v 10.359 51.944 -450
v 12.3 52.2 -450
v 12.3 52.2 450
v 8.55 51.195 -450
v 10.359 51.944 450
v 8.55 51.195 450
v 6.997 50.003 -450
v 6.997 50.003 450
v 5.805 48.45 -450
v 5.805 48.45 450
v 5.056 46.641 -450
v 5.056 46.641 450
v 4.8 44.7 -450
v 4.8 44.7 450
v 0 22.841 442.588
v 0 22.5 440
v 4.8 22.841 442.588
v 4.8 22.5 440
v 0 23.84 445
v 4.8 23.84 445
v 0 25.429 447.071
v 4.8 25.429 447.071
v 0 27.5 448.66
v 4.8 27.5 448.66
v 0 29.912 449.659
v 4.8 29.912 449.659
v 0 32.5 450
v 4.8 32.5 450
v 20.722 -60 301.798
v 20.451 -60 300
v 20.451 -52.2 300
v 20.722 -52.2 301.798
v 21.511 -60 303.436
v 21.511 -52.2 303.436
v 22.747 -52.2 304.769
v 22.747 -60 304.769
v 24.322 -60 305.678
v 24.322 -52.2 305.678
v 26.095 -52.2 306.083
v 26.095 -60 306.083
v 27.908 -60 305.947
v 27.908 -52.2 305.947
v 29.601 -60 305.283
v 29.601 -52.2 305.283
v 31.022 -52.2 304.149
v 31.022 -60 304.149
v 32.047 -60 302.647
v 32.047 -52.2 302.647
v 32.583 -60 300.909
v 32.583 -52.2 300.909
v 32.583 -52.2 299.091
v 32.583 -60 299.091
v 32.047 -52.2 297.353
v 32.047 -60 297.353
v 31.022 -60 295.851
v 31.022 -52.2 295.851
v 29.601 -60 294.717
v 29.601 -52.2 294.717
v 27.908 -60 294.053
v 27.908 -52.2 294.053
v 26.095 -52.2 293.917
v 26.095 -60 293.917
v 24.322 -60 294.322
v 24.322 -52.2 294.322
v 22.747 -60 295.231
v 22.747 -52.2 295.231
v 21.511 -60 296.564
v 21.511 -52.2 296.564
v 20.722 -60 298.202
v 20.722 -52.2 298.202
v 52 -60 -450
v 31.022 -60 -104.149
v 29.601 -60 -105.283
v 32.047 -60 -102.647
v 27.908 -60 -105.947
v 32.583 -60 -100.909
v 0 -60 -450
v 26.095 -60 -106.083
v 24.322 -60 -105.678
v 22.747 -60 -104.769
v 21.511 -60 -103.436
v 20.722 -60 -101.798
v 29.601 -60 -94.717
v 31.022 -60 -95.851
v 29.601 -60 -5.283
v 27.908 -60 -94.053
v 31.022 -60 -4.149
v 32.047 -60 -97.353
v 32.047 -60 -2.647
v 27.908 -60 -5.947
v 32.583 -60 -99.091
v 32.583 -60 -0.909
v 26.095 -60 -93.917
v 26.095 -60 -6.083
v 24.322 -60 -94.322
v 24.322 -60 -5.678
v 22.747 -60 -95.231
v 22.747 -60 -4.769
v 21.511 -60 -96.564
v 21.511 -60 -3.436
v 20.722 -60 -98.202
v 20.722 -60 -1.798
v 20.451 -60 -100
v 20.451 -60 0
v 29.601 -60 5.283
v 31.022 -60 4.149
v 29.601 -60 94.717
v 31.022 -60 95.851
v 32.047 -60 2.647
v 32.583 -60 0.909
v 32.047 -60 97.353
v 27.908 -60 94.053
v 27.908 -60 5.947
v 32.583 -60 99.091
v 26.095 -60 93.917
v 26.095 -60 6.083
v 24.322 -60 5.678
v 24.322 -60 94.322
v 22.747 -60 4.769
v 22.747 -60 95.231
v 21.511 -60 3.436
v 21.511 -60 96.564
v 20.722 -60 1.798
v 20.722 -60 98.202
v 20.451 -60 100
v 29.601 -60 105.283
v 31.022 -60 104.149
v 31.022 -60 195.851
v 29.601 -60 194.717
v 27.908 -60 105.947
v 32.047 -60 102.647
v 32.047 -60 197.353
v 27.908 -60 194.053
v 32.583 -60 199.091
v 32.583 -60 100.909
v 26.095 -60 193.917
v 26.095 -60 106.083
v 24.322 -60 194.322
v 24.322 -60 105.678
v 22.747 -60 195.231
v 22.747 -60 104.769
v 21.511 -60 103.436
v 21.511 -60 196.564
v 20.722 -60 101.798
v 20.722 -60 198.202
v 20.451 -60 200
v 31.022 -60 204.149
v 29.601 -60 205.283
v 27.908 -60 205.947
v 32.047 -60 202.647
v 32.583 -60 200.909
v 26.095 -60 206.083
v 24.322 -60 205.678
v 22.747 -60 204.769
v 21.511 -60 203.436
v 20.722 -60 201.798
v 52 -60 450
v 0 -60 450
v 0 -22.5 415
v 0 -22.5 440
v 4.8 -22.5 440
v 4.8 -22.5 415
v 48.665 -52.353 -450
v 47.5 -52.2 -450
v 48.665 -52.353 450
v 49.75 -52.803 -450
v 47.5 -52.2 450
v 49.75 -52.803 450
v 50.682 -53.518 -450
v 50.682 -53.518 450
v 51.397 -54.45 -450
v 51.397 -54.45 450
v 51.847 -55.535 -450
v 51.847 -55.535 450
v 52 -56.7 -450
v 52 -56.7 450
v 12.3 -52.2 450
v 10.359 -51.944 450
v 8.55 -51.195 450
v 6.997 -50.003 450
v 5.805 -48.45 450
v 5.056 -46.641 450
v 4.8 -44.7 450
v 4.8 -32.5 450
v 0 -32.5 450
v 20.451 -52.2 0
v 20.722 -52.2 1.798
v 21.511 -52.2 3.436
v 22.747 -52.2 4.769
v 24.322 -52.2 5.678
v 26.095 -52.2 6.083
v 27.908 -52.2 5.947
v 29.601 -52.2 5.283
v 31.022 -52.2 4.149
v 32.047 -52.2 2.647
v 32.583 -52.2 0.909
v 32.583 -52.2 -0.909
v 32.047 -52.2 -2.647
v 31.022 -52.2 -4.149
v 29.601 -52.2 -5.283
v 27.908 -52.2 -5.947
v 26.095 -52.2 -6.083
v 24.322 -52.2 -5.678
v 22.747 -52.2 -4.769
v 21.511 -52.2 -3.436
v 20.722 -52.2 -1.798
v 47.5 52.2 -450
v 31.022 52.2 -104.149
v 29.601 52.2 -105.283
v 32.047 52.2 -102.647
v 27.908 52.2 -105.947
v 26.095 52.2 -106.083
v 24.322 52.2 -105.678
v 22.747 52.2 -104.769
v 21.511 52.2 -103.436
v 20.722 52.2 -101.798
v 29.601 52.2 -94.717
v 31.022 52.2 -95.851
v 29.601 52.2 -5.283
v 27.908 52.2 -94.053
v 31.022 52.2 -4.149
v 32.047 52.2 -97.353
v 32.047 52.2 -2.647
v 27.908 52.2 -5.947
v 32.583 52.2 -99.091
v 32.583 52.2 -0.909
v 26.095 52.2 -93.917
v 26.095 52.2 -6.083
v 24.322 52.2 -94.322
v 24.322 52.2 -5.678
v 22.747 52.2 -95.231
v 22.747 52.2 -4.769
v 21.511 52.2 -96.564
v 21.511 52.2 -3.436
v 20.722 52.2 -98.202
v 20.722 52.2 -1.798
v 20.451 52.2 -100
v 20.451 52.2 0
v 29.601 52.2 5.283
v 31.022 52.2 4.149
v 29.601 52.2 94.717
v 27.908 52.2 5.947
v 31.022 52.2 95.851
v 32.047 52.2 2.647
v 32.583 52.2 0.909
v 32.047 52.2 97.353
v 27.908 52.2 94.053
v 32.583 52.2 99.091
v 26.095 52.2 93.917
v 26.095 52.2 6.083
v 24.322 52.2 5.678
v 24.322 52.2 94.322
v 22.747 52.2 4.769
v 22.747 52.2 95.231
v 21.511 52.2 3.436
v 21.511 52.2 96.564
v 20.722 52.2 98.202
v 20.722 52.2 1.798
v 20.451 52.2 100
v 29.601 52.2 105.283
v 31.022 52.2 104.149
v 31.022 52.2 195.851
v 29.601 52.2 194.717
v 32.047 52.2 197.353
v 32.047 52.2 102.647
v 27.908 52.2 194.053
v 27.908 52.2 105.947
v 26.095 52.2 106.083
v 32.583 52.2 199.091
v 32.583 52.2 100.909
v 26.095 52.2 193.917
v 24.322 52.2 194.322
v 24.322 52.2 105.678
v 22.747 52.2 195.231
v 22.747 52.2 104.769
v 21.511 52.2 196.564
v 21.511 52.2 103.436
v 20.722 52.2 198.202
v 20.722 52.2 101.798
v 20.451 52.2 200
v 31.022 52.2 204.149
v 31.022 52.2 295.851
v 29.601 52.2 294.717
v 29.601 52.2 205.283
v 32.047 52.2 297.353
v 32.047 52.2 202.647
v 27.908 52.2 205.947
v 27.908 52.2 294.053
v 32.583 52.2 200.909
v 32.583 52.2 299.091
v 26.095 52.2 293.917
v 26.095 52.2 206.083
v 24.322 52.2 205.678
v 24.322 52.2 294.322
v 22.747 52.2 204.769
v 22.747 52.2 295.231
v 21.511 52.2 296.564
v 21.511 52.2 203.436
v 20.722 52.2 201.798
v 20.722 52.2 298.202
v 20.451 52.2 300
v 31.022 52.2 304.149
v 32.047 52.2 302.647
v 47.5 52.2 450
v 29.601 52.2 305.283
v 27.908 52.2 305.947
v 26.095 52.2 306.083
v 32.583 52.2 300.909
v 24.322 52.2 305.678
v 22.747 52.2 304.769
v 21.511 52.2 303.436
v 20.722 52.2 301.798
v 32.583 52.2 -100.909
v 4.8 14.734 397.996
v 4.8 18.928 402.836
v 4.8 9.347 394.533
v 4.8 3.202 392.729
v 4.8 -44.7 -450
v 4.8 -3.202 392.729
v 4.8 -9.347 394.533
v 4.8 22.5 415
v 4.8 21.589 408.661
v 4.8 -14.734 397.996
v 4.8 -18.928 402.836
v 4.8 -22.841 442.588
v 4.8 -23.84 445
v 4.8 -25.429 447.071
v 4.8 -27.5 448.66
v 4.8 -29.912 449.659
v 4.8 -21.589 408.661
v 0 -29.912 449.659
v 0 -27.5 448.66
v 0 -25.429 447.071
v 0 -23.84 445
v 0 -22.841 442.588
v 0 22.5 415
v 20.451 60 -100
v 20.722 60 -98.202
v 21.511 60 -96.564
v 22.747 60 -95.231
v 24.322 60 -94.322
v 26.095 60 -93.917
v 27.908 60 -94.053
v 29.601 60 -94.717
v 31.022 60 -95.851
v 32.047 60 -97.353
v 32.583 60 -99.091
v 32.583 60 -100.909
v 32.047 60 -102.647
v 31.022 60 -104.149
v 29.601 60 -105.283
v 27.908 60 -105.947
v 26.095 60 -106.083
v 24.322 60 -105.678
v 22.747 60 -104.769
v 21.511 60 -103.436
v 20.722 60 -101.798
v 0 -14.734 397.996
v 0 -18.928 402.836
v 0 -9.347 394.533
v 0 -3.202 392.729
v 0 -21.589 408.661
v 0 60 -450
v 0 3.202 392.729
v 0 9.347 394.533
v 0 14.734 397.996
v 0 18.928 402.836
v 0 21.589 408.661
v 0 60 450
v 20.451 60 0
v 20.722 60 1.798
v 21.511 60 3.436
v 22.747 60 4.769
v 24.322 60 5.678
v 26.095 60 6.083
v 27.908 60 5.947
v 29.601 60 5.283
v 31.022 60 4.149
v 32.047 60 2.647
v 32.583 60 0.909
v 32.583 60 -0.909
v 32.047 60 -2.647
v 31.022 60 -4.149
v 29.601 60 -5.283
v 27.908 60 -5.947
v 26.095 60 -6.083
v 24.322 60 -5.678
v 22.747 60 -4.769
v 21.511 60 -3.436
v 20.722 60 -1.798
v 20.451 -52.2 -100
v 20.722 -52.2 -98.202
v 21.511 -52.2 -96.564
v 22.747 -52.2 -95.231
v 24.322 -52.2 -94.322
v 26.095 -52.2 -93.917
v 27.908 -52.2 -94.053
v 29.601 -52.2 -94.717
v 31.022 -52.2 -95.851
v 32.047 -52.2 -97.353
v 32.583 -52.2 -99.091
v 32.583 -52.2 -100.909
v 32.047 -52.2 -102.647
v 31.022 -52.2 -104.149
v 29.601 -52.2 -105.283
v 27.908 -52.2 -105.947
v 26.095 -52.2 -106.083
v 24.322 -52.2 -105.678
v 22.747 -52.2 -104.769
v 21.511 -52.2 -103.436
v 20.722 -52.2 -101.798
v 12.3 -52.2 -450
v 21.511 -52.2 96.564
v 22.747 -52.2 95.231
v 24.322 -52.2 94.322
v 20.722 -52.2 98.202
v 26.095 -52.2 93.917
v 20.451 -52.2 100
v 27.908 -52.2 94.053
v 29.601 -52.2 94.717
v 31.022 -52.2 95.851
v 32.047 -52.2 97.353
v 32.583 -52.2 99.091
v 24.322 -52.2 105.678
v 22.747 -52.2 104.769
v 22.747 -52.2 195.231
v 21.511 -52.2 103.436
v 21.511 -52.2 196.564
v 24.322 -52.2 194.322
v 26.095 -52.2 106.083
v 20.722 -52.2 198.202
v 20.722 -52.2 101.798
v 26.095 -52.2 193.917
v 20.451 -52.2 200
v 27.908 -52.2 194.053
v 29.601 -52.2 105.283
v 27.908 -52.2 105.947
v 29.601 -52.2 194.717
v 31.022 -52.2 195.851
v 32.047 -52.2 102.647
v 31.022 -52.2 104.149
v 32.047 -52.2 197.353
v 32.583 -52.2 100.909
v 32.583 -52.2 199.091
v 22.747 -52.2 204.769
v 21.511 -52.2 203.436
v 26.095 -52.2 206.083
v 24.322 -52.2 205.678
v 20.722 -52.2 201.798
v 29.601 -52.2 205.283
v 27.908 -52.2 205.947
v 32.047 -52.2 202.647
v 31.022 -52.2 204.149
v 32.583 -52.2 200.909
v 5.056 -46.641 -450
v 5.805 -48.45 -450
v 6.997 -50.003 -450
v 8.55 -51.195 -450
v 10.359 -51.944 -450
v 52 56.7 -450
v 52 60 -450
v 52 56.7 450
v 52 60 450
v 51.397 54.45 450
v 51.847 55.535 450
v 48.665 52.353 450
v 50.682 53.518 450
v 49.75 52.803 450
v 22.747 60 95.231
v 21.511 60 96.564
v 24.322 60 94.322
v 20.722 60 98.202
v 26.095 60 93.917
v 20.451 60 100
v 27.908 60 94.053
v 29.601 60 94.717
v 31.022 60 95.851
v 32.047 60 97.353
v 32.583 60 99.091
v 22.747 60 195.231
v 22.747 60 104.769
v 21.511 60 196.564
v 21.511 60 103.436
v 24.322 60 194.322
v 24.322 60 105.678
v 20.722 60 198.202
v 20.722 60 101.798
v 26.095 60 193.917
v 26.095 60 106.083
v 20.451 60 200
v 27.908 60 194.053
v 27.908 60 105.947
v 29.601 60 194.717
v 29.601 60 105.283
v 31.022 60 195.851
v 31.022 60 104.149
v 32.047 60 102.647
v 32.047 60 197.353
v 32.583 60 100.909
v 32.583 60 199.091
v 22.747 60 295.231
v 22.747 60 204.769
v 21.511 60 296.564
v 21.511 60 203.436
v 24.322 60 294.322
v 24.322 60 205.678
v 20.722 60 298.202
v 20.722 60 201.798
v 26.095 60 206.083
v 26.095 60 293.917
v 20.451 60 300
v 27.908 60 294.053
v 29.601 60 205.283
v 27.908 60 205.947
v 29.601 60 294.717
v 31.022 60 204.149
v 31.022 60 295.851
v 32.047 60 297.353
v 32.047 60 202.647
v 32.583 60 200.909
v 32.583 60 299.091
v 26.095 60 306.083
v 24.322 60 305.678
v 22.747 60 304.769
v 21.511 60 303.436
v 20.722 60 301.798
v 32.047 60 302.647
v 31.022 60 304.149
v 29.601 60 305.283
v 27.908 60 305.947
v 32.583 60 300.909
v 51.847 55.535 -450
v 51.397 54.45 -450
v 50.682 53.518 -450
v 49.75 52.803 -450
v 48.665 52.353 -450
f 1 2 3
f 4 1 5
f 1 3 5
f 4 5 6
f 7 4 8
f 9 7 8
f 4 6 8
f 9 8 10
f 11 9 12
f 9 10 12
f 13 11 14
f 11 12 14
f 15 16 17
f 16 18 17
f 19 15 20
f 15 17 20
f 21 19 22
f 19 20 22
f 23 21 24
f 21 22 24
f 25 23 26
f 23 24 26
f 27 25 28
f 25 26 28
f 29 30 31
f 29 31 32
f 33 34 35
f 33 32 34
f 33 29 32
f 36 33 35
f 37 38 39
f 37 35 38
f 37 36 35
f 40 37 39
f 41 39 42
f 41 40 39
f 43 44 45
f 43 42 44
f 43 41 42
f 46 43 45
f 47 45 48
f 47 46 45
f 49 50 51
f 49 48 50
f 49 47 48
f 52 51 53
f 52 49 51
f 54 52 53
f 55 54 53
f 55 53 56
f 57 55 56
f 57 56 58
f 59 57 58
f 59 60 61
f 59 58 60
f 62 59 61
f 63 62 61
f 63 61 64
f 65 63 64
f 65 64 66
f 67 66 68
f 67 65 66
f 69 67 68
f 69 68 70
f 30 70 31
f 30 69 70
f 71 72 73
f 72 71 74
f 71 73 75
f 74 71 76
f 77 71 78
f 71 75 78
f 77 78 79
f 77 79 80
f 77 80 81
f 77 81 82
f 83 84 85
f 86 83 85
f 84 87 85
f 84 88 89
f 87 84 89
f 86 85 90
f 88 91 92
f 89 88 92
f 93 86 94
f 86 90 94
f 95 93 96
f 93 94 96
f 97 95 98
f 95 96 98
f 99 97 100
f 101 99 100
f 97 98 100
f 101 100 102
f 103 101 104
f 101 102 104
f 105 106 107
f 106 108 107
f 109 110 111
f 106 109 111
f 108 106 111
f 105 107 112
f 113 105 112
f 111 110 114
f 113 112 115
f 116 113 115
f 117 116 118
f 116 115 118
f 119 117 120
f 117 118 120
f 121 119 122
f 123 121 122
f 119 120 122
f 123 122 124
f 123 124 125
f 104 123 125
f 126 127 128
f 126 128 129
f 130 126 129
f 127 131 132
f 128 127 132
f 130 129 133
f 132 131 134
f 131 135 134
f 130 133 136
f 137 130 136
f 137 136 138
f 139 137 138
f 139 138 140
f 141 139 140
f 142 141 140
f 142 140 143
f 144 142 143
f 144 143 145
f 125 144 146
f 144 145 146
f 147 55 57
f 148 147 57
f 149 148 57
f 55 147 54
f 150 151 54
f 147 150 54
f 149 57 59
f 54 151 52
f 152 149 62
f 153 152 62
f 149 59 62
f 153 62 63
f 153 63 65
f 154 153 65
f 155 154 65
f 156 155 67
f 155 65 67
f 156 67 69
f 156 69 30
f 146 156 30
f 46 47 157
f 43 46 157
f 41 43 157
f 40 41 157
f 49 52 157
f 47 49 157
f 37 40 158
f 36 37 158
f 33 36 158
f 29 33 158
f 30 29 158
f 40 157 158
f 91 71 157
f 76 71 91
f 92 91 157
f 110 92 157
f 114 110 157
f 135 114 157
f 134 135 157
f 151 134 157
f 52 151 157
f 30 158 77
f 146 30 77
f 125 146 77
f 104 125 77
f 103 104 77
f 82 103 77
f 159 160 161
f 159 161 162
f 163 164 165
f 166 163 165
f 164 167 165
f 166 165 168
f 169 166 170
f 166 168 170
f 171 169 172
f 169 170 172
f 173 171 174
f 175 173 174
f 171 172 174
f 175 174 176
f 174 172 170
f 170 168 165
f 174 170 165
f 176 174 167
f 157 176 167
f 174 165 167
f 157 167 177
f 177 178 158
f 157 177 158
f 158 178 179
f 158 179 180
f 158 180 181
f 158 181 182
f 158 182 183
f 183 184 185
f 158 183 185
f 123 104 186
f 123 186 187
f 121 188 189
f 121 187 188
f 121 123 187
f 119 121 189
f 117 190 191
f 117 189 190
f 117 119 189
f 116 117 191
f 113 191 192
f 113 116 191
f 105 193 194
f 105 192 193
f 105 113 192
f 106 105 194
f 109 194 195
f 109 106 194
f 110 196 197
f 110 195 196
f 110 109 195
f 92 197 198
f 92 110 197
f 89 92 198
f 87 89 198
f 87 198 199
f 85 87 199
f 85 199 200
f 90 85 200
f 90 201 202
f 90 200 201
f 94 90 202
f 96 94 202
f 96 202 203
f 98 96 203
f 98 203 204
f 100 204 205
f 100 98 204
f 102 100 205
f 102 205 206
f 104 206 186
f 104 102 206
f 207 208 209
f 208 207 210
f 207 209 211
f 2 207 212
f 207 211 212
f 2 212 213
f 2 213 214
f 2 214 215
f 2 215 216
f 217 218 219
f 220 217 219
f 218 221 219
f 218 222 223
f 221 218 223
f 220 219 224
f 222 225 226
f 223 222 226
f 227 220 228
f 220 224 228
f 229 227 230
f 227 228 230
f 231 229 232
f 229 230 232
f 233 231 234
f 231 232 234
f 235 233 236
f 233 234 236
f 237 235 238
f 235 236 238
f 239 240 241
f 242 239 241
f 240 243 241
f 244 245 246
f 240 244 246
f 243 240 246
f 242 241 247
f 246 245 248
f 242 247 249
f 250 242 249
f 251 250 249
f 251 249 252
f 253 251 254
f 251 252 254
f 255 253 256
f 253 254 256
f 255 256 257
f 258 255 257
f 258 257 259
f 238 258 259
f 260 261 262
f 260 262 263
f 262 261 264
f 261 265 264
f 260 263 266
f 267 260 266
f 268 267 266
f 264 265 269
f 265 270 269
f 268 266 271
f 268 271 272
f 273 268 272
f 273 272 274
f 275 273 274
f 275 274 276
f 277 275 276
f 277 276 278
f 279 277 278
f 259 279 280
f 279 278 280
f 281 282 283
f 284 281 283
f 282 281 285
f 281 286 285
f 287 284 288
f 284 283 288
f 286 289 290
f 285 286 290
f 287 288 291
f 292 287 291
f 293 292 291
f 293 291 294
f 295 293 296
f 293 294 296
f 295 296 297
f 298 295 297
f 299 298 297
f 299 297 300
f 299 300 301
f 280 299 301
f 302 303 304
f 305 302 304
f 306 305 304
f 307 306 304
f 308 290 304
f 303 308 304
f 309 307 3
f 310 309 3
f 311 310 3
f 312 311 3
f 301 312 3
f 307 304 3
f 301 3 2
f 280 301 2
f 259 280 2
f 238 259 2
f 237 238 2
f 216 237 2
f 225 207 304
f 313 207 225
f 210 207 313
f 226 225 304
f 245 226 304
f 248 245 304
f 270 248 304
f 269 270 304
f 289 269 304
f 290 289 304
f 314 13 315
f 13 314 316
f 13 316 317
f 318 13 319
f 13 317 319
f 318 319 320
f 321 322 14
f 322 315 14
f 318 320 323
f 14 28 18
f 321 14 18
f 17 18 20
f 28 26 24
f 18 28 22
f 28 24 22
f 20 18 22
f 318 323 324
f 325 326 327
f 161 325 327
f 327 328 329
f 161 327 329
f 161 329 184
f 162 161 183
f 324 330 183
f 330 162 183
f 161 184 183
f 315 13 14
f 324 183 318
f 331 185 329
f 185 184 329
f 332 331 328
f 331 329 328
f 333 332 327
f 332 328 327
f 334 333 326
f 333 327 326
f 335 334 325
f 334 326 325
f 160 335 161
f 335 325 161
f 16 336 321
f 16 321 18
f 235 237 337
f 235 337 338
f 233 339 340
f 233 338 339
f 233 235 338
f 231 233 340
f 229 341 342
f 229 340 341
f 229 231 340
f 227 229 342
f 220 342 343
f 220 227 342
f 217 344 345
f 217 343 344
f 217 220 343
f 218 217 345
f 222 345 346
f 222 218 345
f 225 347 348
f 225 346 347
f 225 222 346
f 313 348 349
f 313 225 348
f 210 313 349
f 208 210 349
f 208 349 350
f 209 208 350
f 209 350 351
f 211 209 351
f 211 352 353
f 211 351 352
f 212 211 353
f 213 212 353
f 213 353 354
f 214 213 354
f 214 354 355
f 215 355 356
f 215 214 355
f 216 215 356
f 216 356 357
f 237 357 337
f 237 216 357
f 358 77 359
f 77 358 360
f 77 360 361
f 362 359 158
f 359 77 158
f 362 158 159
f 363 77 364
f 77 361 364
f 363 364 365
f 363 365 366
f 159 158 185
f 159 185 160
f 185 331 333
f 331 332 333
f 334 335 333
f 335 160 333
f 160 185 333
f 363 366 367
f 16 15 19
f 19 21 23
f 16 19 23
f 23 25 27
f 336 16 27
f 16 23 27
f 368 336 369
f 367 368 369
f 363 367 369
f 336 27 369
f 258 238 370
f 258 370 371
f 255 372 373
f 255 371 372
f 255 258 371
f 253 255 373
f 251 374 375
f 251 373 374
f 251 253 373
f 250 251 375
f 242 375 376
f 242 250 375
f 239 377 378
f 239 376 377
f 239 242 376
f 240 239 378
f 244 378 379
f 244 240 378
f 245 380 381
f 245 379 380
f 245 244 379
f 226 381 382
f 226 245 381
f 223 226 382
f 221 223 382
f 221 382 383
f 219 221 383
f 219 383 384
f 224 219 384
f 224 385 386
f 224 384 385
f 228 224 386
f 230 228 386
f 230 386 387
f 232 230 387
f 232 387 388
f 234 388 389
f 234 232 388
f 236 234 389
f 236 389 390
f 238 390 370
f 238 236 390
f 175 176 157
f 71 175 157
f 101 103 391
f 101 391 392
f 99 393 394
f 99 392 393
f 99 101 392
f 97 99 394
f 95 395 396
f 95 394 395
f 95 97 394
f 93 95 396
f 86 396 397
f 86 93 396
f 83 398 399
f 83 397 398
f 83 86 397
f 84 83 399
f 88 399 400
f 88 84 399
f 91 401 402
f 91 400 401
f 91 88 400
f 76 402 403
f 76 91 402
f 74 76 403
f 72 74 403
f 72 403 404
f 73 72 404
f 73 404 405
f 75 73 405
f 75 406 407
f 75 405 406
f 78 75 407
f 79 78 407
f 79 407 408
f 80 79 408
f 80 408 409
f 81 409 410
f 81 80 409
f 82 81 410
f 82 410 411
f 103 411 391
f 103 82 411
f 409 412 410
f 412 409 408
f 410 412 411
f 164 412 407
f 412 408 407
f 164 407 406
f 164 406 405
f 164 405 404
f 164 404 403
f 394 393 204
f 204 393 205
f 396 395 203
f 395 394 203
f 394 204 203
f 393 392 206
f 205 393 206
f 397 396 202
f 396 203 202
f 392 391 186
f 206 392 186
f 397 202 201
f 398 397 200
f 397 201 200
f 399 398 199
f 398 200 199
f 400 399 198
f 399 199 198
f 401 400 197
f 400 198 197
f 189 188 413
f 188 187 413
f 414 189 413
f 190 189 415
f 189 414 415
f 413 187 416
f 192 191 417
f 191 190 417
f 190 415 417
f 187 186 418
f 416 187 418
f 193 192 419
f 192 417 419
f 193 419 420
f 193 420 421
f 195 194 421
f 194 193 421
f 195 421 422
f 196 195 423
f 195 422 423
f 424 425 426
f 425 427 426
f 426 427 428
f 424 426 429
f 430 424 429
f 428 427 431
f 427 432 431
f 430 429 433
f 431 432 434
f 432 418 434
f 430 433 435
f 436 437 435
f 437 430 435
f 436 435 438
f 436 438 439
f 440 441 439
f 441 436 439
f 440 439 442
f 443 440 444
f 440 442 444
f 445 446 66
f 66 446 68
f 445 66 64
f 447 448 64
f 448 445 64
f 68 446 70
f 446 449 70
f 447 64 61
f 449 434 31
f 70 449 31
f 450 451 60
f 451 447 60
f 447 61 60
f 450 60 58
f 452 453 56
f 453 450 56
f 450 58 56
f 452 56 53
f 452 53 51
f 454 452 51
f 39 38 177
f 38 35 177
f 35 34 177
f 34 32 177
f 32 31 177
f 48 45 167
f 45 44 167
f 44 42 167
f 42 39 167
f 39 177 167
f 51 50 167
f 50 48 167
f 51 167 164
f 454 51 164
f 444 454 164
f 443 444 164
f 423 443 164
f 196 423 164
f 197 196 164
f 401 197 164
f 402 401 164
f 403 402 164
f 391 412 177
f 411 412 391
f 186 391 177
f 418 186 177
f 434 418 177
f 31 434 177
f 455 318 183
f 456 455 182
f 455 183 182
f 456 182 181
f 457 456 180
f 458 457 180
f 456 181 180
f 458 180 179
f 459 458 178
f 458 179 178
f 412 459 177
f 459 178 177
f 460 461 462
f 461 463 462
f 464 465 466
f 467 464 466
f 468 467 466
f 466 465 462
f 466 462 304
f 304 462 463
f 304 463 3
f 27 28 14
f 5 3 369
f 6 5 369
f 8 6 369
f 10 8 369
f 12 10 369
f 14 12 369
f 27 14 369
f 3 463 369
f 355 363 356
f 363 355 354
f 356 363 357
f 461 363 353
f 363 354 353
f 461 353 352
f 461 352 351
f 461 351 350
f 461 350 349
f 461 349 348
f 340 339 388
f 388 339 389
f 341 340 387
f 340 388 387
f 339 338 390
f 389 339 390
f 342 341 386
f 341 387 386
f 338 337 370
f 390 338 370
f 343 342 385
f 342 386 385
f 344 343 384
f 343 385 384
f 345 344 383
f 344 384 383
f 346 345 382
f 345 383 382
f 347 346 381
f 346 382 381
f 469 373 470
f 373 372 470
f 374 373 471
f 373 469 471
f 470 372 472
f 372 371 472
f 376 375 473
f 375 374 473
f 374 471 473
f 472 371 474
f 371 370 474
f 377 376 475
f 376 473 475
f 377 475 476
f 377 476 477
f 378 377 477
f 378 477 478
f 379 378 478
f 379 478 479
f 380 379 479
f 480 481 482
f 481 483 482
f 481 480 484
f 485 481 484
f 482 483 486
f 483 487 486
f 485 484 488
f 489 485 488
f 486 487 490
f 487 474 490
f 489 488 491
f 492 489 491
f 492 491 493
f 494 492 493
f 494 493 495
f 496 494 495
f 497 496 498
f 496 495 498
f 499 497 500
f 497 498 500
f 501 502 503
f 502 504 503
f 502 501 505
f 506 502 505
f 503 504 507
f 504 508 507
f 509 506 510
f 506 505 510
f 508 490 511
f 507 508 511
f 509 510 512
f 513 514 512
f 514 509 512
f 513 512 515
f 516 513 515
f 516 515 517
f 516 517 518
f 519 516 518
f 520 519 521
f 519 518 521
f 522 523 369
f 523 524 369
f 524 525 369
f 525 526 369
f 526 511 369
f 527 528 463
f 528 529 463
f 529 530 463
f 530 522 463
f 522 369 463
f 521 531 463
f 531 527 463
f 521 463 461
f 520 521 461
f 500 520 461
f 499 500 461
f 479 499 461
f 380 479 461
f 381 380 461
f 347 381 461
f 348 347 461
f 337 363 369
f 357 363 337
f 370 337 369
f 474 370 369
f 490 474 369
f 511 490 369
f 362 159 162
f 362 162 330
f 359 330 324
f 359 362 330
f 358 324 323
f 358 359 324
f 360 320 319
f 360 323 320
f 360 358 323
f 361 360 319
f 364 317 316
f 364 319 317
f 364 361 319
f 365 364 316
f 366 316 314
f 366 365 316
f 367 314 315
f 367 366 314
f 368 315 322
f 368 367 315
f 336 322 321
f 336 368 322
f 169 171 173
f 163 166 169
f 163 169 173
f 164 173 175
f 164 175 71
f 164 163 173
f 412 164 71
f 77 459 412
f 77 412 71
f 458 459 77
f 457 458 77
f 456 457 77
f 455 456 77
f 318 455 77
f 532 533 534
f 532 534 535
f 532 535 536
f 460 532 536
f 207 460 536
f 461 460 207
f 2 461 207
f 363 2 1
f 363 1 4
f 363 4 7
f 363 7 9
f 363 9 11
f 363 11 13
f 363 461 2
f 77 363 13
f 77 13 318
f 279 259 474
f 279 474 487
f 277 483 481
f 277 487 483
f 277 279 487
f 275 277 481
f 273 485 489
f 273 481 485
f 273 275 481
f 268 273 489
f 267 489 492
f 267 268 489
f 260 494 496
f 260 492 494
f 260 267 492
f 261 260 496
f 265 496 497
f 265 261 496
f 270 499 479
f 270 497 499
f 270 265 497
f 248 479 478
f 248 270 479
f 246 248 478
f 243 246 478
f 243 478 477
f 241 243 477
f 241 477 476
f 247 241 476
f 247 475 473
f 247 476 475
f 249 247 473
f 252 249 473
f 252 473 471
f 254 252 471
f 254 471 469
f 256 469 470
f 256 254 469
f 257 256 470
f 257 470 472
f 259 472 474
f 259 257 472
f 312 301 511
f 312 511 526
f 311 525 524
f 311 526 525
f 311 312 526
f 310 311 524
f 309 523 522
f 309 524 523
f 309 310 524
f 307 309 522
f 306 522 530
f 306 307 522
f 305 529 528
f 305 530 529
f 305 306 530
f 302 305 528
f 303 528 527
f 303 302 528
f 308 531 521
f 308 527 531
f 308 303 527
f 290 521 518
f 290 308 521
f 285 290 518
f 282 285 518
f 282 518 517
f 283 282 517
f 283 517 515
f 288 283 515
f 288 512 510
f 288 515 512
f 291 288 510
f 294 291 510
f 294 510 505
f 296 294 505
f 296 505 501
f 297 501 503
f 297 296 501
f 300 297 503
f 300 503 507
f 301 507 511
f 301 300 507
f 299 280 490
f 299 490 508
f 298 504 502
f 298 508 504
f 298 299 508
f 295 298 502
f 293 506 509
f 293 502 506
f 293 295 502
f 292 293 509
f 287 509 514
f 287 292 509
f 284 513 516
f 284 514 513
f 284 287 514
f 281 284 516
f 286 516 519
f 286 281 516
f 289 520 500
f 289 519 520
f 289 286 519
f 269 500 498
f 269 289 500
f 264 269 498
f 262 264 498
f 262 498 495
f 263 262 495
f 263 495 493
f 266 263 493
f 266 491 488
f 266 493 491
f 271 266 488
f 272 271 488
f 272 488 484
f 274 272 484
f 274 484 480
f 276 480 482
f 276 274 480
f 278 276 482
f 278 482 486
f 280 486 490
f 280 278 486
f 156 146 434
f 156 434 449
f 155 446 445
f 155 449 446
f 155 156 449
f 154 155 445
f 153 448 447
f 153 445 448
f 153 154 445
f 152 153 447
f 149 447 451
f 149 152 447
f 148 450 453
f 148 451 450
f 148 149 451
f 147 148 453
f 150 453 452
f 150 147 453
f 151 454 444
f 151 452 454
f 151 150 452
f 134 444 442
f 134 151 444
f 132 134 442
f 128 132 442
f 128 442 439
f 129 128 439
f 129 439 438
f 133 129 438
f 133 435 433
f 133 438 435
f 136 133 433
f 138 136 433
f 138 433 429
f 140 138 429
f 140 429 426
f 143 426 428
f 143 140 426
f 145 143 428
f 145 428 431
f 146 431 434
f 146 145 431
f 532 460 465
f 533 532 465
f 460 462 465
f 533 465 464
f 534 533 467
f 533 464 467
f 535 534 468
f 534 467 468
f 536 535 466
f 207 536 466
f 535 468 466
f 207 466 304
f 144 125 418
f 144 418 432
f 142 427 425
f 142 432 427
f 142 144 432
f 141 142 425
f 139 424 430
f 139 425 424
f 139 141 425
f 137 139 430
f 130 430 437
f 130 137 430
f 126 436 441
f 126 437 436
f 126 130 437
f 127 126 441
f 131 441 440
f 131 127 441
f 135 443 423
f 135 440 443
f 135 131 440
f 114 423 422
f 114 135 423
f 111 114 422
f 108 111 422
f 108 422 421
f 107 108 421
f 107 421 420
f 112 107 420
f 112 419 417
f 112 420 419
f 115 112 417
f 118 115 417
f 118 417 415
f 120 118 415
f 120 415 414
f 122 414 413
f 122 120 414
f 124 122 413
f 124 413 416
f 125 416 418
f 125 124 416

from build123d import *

# Parameters (mm, degrees)
EXTRUDE_1_DEPTH          = 450
CUT_EXTRUDE_1_DEPTH      = 5
FILLET_1_R               = 10
CUT_EXTRUDE_2_DEPTH      = 469.619248431
CUT_EXTRUDE_2_DEPTH_BACK = 469.619248431
SKETCH_3_R               = 6.1


with BuildPart() as part:
    # Эскиз1 → Бобышка-Вытянуть1 (new, symmetric)
    with BuildSketch(Plane.XY):
        with BuildLine():
            Line((0, -60), (0, 60))
            Line((0, 60), (52, 60))
            Line((52, 60), (52, 56.7))
            ThreePointArc((52, 56.7), (50.681980515, 53.518019485), (47.5, 52.2))
            Line((47.5, 52.2), (12.3, 52.2))
            ThreePointArc((12.3, 52.2), (6.996699141, 50.003300859), (4.8, 44.7))
            Line((4.8, 44.7), (4.8, -44.7))
            ThreePointArc((4.8, -44.7), (6.996699141, -50.003300859), (12.3, -52.2))
            Line((12.3, -52.2), (47.5, -52.2))
            ThreePointArc((47.5, -52.2), (50.681980515, -53.518019485), (52, -56.7))
            Line((52, -56.7), (52, -60))
            Line((52, -60), (0, -60))
        make_face()
    extrude(amount=EXTRUDE_1_DEPTH, both=True)

    # Эскиз2 → Вырез-Вытянуть1 (cut, symmetric)
    with BuildSketch(Plane.ZY):
        with BuildLine():
            Line((415, 22.5), (450, 22.5))
            Line((450, 22.5), (450, -22.5))
            Line((450, -22.5), (415, -22.5))
            ThreePointArc((415, -22.5), (392.5, 0), (415, 22.5))
        make_face()
    extrude(amount=CUT_EXTRUDE_1_DEPTH, both=True, mode=Mode.SUBTRACT)

    # Скругление1
    fillet_1_edges = [part.edges().sort_by_distance(p)[0] for p in [
        (2.4, -22.5, 450),
        (2.4, 22.5, 450),
    ]]
    fillet(fillet_1_edges, radius=FILLET_1_R)

    # Эскиз3 → Вырез-Вытянуть2 (cut, two sides: drawn at the far end of the back side and taken through both)
    with BuildSketch(Plane(origin=(0, 60, 0), x_dir=(1, 0, 0), z_dir=(0, 1, 0)).offset(-CUT_EXTRUDE_2_DEPTH_BACK)):
        with Locations(Location((26.550751723, -300, 0), (0, 0, 180))):
            Circle(SKETCH_3_R)
        with Locations(Location((26.550751723, -200, 0), (0, 0, 180))):
            Circle(SKETCH_3_R)
        with Locations(Location((26.550751723, -100, 0), (0, 0, 180))):
            Circle(SKETCH_3_R)
        with Locations(Location((26.550751723, 0, 0), (0, 0, 180))):
            Circle(SKETCH_3_R)
        with Locations(Location((26.550751723, 100, 0), (0, 0, 180))):
            Circle(SKETCH_3_R)
    extrude(amount=CUT_EXTRUDE_2_DEPTH + CUT_EXTRUDE_2_DEPTH_BACK, mode=Mode.SUBTRACT)


solid = part.part
